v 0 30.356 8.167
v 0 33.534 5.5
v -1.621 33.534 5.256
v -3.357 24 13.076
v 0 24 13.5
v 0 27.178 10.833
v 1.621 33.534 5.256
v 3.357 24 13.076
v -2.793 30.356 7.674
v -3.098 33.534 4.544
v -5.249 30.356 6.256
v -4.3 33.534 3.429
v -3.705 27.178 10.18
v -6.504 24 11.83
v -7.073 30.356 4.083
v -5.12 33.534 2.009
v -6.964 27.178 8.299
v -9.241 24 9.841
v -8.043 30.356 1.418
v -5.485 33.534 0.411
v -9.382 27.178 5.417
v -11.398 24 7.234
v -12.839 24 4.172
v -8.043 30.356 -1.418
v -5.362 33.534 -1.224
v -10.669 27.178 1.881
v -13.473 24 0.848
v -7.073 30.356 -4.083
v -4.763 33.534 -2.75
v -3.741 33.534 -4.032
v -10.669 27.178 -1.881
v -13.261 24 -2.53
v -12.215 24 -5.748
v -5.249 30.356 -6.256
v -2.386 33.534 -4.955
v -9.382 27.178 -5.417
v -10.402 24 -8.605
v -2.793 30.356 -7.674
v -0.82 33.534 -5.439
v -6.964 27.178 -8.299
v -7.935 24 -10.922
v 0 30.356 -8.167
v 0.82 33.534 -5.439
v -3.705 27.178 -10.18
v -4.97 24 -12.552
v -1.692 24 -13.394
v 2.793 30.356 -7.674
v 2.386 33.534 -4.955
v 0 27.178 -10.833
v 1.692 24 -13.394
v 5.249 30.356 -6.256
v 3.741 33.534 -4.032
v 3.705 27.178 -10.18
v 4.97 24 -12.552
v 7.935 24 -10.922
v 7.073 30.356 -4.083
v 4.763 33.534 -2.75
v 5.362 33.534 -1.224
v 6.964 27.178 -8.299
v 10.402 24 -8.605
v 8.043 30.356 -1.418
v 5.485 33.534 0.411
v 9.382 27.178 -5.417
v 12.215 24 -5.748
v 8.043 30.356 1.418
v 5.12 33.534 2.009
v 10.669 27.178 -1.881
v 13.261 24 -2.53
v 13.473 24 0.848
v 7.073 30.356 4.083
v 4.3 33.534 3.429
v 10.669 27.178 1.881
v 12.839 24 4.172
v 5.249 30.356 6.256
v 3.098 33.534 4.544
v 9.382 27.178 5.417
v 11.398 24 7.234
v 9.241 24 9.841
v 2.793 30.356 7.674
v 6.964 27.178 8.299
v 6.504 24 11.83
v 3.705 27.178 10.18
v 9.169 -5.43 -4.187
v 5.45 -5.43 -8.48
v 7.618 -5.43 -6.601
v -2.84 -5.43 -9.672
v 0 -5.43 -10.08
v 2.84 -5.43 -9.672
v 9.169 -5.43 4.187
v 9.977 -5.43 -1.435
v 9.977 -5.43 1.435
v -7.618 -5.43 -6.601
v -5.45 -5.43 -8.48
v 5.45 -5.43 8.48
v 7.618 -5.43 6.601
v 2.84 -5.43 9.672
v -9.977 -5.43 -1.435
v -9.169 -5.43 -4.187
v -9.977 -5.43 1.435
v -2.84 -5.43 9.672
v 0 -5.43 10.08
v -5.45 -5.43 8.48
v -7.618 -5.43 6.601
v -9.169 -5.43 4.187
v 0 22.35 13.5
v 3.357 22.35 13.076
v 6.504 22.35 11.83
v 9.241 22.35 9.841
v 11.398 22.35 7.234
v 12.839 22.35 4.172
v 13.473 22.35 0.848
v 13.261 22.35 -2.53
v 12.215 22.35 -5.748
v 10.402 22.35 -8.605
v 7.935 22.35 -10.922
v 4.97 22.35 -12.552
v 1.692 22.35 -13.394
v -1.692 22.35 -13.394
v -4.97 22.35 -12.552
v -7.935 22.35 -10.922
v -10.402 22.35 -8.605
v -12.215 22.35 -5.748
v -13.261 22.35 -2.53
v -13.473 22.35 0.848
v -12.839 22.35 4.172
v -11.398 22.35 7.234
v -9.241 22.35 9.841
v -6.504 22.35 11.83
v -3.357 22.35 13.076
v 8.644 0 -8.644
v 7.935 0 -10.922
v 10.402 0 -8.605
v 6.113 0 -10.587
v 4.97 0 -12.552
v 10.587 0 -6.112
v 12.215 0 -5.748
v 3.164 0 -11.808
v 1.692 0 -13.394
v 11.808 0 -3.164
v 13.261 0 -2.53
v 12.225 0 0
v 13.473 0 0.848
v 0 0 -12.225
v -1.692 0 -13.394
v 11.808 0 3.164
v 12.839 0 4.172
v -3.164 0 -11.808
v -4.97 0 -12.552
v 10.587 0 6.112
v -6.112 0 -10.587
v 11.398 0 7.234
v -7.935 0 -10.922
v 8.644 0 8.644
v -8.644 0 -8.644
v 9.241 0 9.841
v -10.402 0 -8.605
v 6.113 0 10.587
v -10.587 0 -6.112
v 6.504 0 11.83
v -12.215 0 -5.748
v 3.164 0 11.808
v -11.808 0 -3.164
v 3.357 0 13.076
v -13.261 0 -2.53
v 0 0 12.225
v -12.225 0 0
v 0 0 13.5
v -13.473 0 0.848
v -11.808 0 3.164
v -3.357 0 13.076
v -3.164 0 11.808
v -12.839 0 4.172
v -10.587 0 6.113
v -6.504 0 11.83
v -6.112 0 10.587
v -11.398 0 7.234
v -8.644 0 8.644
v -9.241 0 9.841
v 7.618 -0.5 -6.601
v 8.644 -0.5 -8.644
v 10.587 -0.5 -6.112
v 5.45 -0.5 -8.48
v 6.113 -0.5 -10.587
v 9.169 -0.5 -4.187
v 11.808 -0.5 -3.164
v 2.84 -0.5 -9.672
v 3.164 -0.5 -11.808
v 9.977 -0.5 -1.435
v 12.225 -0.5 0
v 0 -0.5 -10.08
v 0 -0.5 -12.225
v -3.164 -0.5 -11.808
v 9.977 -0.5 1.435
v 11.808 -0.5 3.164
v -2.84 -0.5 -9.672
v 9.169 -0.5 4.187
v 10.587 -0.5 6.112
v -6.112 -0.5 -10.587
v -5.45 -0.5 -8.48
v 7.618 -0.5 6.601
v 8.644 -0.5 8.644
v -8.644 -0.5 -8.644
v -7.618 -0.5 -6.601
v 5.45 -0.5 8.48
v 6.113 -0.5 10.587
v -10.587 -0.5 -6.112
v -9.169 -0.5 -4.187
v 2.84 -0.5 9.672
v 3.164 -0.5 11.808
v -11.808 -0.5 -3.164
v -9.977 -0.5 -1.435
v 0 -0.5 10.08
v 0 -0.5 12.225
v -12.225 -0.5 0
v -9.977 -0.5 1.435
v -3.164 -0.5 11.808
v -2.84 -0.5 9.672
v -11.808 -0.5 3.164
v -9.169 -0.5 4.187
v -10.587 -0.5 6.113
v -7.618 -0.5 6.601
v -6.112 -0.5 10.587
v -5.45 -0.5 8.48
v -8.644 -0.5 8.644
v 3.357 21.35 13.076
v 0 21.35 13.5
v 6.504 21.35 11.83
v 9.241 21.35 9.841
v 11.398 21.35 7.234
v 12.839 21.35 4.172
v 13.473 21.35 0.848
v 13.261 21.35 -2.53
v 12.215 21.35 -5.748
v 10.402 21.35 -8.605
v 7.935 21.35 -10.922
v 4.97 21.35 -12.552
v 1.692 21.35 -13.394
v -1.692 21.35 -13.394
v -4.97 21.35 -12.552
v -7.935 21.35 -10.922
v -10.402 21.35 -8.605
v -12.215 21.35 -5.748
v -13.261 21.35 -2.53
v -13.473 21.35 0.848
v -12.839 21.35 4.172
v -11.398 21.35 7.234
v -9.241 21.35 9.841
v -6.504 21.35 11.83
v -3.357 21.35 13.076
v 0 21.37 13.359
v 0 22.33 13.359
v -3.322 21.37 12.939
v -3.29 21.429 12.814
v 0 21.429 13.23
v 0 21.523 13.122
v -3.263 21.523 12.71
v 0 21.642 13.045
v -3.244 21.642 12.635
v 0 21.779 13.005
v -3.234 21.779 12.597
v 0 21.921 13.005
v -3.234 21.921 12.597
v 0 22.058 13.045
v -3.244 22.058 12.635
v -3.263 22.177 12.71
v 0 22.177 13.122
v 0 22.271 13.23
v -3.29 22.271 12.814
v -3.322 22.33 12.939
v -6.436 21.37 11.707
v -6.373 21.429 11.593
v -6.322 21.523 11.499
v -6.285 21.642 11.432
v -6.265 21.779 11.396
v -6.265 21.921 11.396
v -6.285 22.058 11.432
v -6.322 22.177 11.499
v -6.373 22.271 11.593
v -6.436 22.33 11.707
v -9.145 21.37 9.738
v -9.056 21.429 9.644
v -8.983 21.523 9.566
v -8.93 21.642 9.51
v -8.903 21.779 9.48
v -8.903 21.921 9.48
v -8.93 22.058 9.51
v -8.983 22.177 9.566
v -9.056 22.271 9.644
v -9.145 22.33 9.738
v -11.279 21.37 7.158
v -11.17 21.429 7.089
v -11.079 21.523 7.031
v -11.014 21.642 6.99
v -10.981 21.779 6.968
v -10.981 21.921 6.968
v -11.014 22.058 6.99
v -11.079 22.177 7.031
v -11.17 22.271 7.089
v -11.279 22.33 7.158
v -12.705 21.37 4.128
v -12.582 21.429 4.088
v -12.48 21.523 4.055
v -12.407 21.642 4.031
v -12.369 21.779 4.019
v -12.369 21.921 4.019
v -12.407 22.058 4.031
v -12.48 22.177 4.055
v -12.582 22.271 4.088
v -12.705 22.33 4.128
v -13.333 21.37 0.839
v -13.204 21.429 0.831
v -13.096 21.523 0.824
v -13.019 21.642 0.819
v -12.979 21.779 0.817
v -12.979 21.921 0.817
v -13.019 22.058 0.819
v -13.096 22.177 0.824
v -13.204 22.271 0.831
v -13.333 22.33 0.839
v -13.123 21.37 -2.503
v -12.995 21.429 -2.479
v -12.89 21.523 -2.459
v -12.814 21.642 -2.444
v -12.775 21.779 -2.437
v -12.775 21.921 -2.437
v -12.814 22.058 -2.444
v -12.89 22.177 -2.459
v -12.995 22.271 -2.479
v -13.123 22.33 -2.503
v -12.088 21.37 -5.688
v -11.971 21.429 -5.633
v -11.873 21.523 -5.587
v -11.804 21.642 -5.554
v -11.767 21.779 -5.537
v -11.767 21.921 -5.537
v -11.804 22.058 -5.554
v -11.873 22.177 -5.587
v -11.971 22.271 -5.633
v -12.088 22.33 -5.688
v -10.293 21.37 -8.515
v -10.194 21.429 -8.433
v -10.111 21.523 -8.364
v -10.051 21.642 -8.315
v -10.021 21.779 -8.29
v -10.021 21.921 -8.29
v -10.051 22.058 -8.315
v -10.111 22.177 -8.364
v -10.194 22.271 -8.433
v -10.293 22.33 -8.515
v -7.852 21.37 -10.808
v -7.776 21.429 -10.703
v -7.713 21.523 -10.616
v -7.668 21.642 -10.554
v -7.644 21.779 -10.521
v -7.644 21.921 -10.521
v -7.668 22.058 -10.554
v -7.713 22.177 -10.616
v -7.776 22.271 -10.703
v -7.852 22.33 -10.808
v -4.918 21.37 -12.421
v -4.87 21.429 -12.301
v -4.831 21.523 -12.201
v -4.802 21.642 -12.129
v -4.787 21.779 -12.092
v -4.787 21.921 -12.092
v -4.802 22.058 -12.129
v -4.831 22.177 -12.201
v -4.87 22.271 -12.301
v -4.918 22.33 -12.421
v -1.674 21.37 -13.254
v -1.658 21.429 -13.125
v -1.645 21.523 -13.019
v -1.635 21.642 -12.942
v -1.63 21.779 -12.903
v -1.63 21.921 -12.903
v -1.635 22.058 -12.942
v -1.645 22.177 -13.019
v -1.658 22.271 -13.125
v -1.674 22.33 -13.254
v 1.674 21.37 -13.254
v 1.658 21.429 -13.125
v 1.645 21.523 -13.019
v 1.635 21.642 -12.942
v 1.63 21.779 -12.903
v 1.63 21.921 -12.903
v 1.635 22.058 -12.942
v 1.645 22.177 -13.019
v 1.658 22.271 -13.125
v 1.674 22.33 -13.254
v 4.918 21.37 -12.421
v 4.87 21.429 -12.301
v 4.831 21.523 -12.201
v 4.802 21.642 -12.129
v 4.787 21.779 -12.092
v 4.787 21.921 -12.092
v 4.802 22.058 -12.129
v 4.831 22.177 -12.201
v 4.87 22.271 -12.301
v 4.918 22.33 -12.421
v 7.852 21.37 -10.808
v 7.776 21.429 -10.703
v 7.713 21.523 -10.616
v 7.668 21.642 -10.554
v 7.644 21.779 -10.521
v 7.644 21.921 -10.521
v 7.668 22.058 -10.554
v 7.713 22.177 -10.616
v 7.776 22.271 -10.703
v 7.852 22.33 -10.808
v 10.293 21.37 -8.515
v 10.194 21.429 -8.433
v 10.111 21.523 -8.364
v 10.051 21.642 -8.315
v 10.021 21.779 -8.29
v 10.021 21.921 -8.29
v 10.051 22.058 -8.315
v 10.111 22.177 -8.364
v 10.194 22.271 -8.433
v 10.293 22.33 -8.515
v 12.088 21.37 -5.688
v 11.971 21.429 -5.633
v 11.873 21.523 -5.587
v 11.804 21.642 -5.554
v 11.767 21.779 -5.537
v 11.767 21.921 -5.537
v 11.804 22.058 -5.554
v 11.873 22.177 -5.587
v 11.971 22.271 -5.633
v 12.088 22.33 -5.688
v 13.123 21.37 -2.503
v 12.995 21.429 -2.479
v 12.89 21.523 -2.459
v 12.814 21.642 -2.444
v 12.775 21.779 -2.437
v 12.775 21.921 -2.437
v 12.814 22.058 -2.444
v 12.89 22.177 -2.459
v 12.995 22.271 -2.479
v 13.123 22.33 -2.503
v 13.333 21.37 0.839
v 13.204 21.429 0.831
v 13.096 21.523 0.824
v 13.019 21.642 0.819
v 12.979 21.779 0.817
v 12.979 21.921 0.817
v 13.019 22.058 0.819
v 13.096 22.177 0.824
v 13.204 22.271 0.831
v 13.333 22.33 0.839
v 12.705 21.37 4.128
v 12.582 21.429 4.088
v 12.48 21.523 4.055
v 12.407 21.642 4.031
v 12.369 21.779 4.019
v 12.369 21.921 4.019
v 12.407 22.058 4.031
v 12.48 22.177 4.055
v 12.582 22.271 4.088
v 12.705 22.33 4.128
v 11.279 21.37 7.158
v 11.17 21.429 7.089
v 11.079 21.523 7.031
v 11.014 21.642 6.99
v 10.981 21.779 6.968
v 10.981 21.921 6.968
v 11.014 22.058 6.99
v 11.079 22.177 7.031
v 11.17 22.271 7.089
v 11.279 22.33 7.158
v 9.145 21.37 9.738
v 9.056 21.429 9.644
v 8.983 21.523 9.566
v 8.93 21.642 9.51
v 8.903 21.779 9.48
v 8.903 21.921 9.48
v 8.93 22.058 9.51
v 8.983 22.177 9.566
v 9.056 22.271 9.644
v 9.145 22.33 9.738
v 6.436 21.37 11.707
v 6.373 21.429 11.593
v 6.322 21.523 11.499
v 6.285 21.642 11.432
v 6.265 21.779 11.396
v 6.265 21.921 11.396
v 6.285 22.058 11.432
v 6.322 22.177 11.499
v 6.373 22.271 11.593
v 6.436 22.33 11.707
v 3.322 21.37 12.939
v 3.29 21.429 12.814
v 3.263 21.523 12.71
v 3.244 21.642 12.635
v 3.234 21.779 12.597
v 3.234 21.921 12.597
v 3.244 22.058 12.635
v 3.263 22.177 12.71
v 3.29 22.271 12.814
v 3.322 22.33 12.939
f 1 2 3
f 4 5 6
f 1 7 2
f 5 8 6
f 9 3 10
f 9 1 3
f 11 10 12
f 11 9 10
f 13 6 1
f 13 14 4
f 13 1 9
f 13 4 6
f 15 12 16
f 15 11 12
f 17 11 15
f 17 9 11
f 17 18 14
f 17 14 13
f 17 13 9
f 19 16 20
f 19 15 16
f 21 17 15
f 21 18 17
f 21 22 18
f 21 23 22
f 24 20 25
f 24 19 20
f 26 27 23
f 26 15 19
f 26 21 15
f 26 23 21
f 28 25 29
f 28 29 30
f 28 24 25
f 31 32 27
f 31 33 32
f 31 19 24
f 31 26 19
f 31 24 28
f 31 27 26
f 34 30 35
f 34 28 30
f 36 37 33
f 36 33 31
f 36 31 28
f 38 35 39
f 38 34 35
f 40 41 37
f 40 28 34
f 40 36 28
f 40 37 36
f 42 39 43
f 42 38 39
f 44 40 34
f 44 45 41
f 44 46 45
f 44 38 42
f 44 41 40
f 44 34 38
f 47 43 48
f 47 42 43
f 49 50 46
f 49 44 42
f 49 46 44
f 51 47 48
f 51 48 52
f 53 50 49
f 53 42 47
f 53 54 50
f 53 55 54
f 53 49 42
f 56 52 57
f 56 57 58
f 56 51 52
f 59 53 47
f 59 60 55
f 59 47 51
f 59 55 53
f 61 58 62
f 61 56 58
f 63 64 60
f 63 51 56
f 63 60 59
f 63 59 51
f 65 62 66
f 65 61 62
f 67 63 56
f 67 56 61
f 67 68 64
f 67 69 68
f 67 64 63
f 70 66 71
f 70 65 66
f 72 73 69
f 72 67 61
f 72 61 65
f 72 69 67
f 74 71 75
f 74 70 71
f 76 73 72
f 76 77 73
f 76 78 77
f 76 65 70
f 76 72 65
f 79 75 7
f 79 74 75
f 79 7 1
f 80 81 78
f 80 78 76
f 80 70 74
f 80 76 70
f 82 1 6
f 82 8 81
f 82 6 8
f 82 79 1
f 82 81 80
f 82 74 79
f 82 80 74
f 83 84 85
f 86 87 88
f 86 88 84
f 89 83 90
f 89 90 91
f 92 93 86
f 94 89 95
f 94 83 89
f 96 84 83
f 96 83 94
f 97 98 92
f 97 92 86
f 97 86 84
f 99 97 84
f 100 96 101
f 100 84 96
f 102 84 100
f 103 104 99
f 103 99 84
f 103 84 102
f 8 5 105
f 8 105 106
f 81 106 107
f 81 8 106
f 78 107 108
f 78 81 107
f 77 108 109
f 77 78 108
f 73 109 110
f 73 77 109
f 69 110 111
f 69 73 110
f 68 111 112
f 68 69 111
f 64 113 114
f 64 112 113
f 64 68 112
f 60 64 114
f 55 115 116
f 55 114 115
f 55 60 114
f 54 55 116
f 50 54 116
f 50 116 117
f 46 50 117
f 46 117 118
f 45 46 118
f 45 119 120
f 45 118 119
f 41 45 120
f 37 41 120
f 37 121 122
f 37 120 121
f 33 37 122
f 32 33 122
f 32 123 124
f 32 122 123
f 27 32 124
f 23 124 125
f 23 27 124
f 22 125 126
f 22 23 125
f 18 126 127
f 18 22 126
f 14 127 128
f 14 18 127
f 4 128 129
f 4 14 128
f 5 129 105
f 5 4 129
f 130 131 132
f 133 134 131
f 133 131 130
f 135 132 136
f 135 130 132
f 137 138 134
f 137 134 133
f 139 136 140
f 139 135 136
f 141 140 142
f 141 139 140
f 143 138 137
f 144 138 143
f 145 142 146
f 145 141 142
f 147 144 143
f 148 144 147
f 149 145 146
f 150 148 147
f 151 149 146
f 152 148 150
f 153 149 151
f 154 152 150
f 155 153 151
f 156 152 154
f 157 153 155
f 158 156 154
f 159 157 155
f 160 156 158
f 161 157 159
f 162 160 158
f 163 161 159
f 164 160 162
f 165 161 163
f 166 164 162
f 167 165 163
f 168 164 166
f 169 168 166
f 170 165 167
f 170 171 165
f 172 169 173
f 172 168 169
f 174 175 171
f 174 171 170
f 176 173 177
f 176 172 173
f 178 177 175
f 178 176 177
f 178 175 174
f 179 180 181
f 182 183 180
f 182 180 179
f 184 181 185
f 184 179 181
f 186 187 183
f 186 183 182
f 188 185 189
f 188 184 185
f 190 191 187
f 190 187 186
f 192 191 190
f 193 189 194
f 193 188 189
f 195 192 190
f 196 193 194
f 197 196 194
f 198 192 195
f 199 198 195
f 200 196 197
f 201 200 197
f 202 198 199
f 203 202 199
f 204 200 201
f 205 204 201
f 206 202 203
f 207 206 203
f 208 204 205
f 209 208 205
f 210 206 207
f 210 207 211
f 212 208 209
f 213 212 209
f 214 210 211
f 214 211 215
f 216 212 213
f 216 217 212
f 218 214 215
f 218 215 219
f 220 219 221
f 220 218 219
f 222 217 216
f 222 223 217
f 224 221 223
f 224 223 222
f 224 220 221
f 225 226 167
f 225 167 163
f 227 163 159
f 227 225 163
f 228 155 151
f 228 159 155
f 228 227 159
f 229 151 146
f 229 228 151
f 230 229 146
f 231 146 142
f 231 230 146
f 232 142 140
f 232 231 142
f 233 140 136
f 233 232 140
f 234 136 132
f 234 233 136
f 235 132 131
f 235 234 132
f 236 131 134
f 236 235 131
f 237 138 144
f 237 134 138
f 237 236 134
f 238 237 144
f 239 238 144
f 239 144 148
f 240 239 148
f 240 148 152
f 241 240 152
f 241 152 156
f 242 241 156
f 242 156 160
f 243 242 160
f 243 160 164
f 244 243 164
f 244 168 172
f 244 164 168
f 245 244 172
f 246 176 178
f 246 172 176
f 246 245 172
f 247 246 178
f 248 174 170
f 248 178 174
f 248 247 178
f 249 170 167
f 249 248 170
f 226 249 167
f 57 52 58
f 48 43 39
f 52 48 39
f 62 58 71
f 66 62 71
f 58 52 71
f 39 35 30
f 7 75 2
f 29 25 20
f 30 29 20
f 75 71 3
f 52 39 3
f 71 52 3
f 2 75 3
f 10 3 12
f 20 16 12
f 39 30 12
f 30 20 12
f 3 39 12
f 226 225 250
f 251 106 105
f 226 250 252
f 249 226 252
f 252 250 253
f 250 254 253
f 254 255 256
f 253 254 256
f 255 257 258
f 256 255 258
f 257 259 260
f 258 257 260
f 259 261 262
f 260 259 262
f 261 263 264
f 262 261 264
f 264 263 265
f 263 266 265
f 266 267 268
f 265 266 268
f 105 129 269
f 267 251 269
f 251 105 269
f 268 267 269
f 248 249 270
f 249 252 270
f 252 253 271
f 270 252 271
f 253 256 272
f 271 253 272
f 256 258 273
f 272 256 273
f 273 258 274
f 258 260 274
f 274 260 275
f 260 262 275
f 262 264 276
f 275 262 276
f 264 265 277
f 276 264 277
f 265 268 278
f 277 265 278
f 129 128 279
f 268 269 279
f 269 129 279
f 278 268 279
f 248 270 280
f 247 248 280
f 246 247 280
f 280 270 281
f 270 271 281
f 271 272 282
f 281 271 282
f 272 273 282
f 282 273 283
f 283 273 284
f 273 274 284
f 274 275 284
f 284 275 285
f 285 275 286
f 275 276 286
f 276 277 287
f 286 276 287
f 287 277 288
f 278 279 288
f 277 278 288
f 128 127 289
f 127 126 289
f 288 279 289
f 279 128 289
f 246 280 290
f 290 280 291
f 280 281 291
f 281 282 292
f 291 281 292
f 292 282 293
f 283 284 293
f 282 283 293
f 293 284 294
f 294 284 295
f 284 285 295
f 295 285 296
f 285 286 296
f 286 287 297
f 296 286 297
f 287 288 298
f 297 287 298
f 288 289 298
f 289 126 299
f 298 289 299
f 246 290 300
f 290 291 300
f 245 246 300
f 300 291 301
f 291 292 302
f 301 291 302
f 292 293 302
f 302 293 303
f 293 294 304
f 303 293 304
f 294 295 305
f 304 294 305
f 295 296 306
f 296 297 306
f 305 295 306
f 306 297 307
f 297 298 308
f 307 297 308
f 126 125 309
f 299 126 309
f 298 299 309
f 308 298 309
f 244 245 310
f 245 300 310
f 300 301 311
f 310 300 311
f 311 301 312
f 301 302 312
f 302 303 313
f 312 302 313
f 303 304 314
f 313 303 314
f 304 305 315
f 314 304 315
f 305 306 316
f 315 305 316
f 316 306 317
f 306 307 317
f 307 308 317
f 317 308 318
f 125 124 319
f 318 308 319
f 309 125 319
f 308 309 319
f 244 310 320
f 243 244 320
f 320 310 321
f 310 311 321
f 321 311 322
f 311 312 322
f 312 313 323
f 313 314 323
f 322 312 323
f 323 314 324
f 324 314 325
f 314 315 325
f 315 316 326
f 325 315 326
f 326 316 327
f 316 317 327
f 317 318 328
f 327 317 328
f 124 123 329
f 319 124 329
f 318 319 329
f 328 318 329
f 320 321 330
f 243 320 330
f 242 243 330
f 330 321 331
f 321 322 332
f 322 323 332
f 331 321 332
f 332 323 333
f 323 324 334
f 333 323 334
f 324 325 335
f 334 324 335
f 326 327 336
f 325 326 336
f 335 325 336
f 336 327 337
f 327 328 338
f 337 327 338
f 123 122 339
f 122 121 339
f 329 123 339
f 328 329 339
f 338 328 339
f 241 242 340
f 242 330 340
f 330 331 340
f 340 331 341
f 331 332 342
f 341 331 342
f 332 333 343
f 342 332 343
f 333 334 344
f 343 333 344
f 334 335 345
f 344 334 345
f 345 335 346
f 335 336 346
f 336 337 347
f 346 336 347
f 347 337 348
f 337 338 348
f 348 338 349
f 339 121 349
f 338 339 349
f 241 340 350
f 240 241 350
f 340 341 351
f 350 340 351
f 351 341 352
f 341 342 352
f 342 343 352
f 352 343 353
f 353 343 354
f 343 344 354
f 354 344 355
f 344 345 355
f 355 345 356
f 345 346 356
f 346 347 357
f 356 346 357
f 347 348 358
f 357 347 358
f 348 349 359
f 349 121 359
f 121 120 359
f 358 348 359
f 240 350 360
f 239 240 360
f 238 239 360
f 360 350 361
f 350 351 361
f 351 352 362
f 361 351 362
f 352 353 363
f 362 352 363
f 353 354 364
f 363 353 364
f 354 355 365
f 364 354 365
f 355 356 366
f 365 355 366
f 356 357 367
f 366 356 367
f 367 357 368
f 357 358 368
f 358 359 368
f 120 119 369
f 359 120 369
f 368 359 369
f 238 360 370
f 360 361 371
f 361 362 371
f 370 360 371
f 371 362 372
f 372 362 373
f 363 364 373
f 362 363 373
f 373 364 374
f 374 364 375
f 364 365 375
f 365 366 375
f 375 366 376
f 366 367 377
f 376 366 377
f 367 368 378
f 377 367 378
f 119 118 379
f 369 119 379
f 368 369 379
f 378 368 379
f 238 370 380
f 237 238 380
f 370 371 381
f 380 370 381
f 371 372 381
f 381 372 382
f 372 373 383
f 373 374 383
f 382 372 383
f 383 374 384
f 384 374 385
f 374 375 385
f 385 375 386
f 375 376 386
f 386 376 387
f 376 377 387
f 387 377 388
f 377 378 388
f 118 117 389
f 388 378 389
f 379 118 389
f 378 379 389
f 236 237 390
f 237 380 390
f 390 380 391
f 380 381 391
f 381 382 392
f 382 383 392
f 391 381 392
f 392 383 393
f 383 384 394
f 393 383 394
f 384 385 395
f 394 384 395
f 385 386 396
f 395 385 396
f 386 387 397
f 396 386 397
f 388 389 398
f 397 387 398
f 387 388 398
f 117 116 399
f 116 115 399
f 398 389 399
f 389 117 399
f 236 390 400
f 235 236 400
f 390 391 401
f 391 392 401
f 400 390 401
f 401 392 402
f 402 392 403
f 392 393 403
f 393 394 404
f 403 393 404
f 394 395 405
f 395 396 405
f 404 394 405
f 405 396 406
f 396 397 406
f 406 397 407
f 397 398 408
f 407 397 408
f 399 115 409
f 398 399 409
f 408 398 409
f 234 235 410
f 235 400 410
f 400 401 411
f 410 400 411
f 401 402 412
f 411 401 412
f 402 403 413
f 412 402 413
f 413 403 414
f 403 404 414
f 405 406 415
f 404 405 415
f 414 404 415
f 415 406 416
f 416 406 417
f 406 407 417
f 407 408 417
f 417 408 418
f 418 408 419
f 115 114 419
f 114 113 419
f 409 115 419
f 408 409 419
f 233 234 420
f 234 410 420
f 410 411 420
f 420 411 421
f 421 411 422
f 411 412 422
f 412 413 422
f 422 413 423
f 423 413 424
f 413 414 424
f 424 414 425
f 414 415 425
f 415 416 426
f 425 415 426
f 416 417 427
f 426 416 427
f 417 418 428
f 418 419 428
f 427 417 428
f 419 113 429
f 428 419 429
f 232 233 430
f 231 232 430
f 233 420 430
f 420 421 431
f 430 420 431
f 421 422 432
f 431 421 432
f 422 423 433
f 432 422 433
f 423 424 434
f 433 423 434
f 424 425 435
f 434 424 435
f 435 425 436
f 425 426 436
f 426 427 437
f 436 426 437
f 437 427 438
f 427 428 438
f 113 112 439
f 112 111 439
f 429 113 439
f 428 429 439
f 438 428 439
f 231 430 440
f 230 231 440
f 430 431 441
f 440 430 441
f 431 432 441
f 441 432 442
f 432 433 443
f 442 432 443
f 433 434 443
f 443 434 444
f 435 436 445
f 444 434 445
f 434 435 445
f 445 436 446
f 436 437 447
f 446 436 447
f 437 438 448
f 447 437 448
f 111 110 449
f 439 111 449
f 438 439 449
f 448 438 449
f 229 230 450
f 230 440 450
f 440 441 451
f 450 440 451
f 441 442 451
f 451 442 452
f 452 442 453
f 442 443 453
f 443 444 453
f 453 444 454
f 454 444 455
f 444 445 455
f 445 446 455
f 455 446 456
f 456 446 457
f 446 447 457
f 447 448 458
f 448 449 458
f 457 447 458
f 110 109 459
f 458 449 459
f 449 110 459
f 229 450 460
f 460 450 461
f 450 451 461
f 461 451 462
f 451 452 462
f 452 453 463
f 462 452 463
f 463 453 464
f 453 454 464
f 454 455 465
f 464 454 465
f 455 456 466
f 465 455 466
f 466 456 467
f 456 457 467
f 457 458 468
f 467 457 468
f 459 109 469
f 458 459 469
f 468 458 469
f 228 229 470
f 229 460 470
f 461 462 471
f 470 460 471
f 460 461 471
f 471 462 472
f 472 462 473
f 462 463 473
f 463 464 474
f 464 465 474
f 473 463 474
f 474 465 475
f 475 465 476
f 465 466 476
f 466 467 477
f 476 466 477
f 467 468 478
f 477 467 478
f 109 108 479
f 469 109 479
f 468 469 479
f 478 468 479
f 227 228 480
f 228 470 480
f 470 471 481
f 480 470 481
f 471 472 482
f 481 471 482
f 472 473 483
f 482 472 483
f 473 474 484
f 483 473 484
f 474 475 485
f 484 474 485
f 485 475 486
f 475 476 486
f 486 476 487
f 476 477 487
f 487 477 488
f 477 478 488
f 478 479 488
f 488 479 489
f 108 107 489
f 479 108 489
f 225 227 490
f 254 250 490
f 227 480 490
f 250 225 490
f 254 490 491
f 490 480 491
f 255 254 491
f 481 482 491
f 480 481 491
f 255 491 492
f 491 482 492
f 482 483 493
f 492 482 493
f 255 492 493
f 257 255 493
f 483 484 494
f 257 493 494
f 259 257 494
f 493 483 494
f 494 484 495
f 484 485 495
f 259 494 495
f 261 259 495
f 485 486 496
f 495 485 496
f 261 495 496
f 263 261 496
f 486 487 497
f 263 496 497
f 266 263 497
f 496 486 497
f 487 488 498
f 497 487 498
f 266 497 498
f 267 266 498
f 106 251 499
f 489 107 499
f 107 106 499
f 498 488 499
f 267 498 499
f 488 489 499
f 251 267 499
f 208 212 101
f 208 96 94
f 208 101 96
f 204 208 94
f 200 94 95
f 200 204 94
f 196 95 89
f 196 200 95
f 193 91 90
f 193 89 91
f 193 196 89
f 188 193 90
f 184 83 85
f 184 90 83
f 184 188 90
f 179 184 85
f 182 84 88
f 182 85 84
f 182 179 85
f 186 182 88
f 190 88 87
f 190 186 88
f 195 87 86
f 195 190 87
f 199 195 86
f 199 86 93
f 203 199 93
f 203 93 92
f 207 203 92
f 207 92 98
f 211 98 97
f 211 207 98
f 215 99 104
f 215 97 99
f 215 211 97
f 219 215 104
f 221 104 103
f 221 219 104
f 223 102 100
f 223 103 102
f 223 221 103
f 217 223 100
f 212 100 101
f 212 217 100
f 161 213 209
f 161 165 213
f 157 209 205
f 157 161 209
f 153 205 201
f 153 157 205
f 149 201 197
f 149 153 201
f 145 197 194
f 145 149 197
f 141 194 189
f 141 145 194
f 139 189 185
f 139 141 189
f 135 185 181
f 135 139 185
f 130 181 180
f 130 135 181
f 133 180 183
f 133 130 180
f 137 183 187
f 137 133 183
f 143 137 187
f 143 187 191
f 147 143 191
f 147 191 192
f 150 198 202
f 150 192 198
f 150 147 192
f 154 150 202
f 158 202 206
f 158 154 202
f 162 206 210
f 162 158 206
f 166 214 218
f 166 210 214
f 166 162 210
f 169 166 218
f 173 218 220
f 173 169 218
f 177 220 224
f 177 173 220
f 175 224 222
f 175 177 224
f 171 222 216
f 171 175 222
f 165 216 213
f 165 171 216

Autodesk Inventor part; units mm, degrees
ref_plane "YZ Plane" through (0, 0, 0) normal (1, 0, 0) x (0, 1, 0)
ref_plane "XZ Plane" through (0, 0, 0) normal (0, 1, 0) x (-1, 0, 0)
ref_plane "XY Plane" through (0, 0, 0) normal (0, 0, 1) x (1, 0, 0)
sketch "Skizze1" plane through (0, 0, 0) normal (1, 0, 0) x (0, 1, 0)
  line L0 (0, 13.5) -> (24, 13.5)
  line L1 (24, 13.5) -> (33.534, 5.5)
  line L2 (33.534, 5.5) -> (33.534, 0)
  line L3 (33.534, 0) -> (0, 0)
  line L4 (0, 0) -> (0, 13.5)
  arc A0 (21.35, 13.5) -> (22.35, 13.5) centre (21.85, 13.5) ccw
  line L5 (0, 0) -> (-0.5, 0)
  line L6 (-0.5, 0) -> (-0.5, 12.225)
  line L7 (-0.5, 12.225) -> (0, 12.225)
  line L8 (0, 12.225) -> (0, 0)
  line L9 (-0.5, 0) -> (-5.43, 0)
  line L10 (-5.43, 0) -> (-5.43, 10.08)
  line L11 (-5.43, 10.08) -> (-0.5, 10.08)
  line L12 (-0.5, 10.08) -> (-0.5, 0)
  point P0 (-0.5, 10.08)
  dimension "d0" = 24
  dimension "d1" = 140
  dimension "d2" = 5.5
  dimension "d3" = 1
  dimension "d4" = 0.5
  dimension "d5" = 1.65
  dimension "d6" = 0.5
  dimension "d7" = 12.225
  dimension "d8" = 4.93
  dimension "d9" = 10.08
revolve "Umdrehung1" add sketch "Skizze1" angle 360 about axis through (0, 33.534, 0) along (0, -1, 0) contours L0 A0 L1 L2 L3 L4 | L4 L5 L6 L7 | L9 L10 L11 L6
properties part number "00_10x_Objective_ViewSolutions_bm05073332"
